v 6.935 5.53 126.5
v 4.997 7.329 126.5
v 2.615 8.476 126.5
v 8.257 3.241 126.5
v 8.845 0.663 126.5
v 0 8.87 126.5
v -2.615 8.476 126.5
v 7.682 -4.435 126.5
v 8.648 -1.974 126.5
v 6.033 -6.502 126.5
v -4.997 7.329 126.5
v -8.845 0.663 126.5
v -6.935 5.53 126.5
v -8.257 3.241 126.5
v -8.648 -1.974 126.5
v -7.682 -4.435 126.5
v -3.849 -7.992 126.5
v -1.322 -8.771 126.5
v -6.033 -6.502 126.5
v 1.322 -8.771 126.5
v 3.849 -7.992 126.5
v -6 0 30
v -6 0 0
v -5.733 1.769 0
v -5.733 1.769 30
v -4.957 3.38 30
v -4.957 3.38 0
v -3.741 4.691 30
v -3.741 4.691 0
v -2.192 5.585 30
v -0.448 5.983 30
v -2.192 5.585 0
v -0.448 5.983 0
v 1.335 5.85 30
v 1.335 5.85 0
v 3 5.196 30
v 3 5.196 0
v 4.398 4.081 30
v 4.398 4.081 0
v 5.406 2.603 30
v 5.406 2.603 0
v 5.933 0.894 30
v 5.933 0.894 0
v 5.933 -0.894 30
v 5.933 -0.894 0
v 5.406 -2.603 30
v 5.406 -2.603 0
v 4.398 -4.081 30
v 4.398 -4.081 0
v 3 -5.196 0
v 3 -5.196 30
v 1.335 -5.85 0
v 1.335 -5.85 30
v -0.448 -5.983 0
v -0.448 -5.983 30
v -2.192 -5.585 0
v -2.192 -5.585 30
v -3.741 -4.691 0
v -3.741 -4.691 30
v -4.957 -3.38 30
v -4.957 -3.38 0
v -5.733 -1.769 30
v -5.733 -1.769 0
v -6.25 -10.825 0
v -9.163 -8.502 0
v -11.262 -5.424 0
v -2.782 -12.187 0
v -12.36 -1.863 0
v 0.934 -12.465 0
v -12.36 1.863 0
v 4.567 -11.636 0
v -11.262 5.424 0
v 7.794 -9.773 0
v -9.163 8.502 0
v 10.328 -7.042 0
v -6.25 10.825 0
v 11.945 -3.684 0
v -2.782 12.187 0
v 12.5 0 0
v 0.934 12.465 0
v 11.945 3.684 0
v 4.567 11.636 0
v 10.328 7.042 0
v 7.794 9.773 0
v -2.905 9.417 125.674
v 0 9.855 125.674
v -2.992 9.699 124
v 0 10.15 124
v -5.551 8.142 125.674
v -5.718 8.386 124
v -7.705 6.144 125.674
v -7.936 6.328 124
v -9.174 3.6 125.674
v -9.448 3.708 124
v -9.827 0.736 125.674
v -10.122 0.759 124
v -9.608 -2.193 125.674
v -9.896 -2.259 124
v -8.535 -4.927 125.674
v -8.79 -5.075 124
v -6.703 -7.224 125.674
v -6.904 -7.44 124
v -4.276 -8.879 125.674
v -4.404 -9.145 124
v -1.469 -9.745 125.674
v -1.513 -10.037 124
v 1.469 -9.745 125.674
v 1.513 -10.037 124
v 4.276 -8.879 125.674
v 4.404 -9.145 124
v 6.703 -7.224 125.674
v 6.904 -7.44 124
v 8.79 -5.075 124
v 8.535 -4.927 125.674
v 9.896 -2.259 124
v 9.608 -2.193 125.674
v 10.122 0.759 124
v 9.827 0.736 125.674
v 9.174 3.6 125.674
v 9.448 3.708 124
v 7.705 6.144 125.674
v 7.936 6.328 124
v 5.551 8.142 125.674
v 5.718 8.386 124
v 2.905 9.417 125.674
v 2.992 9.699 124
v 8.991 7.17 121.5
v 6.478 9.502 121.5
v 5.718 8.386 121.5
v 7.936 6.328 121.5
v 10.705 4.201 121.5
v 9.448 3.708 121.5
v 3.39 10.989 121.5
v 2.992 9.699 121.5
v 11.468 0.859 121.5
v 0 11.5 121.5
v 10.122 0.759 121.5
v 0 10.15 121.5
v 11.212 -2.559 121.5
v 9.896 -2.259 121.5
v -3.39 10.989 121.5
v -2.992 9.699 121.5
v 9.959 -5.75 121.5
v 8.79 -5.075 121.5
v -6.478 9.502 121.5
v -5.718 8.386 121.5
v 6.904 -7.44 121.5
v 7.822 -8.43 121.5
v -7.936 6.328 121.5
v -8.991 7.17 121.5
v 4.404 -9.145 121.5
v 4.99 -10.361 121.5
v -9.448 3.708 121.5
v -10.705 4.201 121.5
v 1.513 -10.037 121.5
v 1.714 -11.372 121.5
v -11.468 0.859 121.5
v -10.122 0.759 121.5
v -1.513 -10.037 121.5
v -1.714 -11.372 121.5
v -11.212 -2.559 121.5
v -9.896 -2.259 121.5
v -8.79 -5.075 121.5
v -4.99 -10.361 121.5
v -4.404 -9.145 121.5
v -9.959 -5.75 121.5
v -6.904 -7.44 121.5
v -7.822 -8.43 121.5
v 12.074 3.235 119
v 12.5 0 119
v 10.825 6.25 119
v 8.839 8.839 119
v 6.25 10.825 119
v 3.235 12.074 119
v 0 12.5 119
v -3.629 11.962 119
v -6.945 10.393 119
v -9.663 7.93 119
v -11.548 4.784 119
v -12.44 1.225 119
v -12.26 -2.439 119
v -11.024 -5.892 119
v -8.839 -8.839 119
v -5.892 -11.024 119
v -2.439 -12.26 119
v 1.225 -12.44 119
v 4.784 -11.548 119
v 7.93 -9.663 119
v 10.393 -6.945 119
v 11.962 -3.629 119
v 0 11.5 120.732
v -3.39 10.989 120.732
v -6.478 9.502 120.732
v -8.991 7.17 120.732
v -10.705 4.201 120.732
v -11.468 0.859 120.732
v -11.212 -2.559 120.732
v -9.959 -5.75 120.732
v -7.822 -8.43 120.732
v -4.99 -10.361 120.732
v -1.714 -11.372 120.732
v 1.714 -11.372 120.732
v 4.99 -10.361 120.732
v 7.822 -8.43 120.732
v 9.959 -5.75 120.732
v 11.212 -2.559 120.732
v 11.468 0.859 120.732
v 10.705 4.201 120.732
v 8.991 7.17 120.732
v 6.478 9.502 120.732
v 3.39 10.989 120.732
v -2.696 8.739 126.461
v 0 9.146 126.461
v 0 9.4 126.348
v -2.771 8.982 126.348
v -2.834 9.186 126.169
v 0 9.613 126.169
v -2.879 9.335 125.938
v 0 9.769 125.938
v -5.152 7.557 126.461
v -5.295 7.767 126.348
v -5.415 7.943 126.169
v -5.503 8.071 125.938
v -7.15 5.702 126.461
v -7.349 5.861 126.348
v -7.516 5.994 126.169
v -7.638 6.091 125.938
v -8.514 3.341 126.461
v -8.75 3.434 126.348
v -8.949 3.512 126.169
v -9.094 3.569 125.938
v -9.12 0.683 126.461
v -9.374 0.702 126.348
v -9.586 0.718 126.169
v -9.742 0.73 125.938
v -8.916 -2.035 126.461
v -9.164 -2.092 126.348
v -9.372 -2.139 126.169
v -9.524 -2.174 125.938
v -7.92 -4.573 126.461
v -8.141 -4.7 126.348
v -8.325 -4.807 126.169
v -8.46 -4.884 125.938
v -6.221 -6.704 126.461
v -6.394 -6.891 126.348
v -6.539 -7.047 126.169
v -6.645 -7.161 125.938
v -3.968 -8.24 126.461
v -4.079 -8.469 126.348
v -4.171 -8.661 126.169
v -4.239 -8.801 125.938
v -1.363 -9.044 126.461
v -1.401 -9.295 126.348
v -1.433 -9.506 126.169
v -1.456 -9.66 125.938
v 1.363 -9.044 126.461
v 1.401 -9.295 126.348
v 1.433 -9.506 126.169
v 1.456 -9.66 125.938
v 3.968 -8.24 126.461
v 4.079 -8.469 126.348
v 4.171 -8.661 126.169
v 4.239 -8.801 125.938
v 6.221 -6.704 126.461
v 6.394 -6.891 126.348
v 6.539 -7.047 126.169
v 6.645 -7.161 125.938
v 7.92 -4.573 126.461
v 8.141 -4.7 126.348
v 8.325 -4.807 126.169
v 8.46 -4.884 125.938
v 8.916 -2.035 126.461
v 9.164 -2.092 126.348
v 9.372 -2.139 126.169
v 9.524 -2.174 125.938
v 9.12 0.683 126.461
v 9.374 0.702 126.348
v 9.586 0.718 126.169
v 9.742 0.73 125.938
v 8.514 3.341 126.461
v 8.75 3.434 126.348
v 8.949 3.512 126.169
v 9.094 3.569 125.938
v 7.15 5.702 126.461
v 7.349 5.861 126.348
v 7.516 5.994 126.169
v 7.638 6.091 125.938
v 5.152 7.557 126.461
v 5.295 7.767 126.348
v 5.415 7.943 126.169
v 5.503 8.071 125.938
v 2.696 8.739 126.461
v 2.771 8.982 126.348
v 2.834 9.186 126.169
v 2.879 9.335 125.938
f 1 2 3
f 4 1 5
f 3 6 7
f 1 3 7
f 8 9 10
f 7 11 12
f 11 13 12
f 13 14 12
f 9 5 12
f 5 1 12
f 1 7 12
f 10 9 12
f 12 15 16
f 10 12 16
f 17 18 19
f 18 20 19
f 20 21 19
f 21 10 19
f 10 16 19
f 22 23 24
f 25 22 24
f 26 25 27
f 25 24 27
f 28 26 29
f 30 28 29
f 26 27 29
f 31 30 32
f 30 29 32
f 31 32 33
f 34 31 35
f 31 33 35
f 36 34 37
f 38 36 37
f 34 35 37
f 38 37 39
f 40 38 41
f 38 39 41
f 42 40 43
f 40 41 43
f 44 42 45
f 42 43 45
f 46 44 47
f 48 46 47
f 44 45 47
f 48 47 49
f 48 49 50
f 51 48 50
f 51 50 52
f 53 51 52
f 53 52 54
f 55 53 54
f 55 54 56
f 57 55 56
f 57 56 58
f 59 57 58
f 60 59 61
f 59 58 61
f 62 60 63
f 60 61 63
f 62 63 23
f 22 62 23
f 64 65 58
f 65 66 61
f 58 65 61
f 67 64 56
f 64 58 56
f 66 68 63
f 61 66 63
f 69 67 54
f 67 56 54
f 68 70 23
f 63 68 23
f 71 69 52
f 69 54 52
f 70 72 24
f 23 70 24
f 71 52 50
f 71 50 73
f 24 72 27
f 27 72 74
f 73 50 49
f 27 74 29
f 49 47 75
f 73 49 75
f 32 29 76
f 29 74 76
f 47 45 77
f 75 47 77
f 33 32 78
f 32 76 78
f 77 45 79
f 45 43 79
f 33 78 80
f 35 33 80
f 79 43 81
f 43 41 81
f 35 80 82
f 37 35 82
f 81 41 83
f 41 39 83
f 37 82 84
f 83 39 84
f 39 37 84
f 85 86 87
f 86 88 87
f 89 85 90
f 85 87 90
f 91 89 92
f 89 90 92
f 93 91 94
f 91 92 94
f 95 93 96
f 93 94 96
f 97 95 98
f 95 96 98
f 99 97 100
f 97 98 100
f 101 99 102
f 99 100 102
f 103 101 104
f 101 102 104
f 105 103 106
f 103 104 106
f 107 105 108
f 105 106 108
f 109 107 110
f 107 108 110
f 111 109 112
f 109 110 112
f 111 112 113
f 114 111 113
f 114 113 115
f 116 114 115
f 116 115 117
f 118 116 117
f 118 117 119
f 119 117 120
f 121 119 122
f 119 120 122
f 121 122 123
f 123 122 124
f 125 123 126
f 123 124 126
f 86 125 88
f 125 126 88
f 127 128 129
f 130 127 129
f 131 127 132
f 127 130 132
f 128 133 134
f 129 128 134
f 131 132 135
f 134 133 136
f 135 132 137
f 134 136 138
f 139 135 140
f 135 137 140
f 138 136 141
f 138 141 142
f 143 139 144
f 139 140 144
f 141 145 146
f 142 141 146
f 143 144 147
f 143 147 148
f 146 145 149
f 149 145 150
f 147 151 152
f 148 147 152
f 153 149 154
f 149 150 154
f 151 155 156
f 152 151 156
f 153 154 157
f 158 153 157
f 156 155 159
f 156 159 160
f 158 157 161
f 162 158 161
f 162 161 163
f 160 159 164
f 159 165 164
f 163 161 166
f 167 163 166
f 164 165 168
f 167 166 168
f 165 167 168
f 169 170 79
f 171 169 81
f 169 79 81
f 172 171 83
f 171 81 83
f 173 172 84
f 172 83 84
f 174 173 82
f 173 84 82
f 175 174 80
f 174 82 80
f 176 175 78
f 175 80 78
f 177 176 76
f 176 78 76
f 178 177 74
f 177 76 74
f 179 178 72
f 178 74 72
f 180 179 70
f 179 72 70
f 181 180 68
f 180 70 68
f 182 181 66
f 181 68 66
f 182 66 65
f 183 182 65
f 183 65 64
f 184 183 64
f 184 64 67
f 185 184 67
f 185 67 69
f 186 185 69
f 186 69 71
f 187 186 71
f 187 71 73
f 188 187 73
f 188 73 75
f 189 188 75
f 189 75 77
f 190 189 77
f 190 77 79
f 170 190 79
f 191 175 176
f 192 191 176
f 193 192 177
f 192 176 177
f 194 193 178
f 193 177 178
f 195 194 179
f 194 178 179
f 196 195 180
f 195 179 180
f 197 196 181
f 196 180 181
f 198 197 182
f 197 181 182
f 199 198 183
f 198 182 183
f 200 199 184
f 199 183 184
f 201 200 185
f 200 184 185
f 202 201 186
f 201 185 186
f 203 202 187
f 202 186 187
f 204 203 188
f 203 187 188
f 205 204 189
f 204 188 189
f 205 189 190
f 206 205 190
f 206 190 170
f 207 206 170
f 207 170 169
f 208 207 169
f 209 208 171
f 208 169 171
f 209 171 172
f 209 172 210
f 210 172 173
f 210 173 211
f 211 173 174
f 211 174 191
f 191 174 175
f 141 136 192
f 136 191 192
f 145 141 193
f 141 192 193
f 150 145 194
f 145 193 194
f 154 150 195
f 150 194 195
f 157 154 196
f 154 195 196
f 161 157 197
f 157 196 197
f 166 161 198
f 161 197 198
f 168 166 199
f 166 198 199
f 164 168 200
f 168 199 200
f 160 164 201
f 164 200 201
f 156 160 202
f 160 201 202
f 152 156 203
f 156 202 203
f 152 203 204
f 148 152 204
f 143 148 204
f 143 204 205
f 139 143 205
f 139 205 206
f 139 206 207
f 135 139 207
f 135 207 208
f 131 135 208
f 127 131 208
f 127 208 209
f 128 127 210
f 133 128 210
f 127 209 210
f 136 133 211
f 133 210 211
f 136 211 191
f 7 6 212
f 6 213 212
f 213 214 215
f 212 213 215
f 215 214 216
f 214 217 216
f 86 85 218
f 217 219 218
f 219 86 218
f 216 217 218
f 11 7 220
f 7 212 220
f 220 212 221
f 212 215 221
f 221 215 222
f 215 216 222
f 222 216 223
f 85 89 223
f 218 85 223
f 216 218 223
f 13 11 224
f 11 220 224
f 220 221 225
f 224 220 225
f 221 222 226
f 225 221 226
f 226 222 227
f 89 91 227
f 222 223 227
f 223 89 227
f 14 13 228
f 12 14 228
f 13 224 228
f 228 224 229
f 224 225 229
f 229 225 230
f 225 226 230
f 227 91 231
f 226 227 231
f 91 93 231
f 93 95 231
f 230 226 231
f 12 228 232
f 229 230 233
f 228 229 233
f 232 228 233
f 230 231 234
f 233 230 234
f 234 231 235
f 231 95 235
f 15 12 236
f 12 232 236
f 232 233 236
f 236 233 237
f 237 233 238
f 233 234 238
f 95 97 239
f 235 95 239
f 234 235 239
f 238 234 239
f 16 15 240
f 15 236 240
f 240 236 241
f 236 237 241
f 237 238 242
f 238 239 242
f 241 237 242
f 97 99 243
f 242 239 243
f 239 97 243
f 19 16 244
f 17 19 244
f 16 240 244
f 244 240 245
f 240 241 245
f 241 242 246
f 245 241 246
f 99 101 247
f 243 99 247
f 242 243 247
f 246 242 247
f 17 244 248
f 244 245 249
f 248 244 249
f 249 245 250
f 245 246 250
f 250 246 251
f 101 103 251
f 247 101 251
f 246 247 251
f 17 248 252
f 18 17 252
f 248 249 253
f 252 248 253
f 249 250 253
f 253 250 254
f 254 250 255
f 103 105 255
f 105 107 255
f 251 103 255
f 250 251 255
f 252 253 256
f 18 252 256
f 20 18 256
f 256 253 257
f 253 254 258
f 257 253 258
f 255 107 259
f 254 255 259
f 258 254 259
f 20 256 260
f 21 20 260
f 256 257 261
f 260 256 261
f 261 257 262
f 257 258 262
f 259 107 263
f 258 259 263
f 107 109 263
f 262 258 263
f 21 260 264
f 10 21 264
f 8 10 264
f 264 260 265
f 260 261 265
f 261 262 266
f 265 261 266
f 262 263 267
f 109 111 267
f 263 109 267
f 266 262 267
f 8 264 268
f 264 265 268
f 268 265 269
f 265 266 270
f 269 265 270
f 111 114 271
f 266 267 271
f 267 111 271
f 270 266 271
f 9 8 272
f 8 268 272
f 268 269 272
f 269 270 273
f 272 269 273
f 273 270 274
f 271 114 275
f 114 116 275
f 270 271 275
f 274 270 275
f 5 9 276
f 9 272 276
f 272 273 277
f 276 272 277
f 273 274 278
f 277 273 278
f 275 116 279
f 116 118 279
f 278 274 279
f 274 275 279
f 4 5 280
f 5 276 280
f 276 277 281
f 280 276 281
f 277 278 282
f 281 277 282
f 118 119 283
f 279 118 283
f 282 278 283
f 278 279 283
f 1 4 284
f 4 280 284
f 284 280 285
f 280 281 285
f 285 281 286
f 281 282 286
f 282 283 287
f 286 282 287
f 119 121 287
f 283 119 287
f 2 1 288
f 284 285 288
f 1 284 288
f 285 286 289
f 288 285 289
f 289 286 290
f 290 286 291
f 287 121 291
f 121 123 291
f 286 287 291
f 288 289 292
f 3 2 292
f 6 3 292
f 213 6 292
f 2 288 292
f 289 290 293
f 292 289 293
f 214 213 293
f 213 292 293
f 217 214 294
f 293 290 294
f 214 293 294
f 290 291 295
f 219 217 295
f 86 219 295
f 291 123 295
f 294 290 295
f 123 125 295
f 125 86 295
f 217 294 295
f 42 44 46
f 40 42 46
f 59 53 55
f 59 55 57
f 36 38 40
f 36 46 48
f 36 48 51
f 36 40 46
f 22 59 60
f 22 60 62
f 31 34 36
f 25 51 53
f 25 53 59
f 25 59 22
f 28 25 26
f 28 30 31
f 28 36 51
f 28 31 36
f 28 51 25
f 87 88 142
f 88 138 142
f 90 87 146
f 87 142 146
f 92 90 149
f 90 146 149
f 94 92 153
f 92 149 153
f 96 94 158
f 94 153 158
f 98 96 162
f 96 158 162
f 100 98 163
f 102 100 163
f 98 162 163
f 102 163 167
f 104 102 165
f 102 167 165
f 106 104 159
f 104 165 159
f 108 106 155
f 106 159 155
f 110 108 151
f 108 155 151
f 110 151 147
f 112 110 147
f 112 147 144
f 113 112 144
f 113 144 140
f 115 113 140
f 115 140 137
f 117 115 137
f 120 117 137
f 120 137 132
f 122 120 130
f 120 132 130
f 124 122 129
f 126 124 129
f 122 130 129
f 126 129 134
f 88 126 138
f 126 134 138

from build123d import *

# Parameters (mm, degrees)
CROQUIS1_R              = 12.5
SALIENTE_EXTRUIR1_DEPTH = 119
CROQUIS5_R              = 6
CORTAR_EXTRUIR1_DEPTH   = 30


with BuildPart() as part:
    # Croquis1 → Saliente-Extruir1 (new body)
    with BuildSketch(Plane.XY):
        Circle(CROQUIS1_R)
    extrude(amount=SALIENTE_EXTRUIR1_DEPTH)

    # Croquis4 → Revolución1 (revolve)
    with BuildSketch(Plane(origin=(0, 0, 0), x_dir=(0, 0, -1), z_dir=(1, 0, 0)), mode=Mode.PRIVATE) as revoluci_n1_sk:
        with BuildLine():
            Line((-119, 0), (-126.5, 0))
            Line((-126.5, 0), (-126.5, -8.870082917))
            ThreePointArc((-126.5, -8.870082917), (-126.266044443, -9.512870527), (-125.673648178, -9.85489067))
            Line((-125.673648178, -9.85489067), (-124, -10.15))
            Line((-124, -10.15), (-121.5, -10.15))
            Line((-121.5, -10.15), (-121.5, -11.5))
            Line((-121.5, -11.5), (-120.732050808, -11.5))
            Line((-120.732050808, -11.5), (-119, -12.5))
            Line((-119, -12.5), (-119, 0))
        make_face()
    revolve(revoluci_n1_sk.sketch.rotate(Axis((0, 0, 119), (0, 0, 1)), 180), axis=Axis((0, 0, 119), (0, 0, 1)))

    # Croquis5 → Cortar-Extruir1 (cut)
    with BuildSketch(Plane(origin=(0, 0, 0), x_dir=(-1, 0, 0), z_dir=(0, 0, -1))):
        Circle(CROQUIS5_R)
    extrude(amount=-CORTAR_EXTRUIR1_DEPTH, mode=Mode.SUBTRACT)


solid = part.part
